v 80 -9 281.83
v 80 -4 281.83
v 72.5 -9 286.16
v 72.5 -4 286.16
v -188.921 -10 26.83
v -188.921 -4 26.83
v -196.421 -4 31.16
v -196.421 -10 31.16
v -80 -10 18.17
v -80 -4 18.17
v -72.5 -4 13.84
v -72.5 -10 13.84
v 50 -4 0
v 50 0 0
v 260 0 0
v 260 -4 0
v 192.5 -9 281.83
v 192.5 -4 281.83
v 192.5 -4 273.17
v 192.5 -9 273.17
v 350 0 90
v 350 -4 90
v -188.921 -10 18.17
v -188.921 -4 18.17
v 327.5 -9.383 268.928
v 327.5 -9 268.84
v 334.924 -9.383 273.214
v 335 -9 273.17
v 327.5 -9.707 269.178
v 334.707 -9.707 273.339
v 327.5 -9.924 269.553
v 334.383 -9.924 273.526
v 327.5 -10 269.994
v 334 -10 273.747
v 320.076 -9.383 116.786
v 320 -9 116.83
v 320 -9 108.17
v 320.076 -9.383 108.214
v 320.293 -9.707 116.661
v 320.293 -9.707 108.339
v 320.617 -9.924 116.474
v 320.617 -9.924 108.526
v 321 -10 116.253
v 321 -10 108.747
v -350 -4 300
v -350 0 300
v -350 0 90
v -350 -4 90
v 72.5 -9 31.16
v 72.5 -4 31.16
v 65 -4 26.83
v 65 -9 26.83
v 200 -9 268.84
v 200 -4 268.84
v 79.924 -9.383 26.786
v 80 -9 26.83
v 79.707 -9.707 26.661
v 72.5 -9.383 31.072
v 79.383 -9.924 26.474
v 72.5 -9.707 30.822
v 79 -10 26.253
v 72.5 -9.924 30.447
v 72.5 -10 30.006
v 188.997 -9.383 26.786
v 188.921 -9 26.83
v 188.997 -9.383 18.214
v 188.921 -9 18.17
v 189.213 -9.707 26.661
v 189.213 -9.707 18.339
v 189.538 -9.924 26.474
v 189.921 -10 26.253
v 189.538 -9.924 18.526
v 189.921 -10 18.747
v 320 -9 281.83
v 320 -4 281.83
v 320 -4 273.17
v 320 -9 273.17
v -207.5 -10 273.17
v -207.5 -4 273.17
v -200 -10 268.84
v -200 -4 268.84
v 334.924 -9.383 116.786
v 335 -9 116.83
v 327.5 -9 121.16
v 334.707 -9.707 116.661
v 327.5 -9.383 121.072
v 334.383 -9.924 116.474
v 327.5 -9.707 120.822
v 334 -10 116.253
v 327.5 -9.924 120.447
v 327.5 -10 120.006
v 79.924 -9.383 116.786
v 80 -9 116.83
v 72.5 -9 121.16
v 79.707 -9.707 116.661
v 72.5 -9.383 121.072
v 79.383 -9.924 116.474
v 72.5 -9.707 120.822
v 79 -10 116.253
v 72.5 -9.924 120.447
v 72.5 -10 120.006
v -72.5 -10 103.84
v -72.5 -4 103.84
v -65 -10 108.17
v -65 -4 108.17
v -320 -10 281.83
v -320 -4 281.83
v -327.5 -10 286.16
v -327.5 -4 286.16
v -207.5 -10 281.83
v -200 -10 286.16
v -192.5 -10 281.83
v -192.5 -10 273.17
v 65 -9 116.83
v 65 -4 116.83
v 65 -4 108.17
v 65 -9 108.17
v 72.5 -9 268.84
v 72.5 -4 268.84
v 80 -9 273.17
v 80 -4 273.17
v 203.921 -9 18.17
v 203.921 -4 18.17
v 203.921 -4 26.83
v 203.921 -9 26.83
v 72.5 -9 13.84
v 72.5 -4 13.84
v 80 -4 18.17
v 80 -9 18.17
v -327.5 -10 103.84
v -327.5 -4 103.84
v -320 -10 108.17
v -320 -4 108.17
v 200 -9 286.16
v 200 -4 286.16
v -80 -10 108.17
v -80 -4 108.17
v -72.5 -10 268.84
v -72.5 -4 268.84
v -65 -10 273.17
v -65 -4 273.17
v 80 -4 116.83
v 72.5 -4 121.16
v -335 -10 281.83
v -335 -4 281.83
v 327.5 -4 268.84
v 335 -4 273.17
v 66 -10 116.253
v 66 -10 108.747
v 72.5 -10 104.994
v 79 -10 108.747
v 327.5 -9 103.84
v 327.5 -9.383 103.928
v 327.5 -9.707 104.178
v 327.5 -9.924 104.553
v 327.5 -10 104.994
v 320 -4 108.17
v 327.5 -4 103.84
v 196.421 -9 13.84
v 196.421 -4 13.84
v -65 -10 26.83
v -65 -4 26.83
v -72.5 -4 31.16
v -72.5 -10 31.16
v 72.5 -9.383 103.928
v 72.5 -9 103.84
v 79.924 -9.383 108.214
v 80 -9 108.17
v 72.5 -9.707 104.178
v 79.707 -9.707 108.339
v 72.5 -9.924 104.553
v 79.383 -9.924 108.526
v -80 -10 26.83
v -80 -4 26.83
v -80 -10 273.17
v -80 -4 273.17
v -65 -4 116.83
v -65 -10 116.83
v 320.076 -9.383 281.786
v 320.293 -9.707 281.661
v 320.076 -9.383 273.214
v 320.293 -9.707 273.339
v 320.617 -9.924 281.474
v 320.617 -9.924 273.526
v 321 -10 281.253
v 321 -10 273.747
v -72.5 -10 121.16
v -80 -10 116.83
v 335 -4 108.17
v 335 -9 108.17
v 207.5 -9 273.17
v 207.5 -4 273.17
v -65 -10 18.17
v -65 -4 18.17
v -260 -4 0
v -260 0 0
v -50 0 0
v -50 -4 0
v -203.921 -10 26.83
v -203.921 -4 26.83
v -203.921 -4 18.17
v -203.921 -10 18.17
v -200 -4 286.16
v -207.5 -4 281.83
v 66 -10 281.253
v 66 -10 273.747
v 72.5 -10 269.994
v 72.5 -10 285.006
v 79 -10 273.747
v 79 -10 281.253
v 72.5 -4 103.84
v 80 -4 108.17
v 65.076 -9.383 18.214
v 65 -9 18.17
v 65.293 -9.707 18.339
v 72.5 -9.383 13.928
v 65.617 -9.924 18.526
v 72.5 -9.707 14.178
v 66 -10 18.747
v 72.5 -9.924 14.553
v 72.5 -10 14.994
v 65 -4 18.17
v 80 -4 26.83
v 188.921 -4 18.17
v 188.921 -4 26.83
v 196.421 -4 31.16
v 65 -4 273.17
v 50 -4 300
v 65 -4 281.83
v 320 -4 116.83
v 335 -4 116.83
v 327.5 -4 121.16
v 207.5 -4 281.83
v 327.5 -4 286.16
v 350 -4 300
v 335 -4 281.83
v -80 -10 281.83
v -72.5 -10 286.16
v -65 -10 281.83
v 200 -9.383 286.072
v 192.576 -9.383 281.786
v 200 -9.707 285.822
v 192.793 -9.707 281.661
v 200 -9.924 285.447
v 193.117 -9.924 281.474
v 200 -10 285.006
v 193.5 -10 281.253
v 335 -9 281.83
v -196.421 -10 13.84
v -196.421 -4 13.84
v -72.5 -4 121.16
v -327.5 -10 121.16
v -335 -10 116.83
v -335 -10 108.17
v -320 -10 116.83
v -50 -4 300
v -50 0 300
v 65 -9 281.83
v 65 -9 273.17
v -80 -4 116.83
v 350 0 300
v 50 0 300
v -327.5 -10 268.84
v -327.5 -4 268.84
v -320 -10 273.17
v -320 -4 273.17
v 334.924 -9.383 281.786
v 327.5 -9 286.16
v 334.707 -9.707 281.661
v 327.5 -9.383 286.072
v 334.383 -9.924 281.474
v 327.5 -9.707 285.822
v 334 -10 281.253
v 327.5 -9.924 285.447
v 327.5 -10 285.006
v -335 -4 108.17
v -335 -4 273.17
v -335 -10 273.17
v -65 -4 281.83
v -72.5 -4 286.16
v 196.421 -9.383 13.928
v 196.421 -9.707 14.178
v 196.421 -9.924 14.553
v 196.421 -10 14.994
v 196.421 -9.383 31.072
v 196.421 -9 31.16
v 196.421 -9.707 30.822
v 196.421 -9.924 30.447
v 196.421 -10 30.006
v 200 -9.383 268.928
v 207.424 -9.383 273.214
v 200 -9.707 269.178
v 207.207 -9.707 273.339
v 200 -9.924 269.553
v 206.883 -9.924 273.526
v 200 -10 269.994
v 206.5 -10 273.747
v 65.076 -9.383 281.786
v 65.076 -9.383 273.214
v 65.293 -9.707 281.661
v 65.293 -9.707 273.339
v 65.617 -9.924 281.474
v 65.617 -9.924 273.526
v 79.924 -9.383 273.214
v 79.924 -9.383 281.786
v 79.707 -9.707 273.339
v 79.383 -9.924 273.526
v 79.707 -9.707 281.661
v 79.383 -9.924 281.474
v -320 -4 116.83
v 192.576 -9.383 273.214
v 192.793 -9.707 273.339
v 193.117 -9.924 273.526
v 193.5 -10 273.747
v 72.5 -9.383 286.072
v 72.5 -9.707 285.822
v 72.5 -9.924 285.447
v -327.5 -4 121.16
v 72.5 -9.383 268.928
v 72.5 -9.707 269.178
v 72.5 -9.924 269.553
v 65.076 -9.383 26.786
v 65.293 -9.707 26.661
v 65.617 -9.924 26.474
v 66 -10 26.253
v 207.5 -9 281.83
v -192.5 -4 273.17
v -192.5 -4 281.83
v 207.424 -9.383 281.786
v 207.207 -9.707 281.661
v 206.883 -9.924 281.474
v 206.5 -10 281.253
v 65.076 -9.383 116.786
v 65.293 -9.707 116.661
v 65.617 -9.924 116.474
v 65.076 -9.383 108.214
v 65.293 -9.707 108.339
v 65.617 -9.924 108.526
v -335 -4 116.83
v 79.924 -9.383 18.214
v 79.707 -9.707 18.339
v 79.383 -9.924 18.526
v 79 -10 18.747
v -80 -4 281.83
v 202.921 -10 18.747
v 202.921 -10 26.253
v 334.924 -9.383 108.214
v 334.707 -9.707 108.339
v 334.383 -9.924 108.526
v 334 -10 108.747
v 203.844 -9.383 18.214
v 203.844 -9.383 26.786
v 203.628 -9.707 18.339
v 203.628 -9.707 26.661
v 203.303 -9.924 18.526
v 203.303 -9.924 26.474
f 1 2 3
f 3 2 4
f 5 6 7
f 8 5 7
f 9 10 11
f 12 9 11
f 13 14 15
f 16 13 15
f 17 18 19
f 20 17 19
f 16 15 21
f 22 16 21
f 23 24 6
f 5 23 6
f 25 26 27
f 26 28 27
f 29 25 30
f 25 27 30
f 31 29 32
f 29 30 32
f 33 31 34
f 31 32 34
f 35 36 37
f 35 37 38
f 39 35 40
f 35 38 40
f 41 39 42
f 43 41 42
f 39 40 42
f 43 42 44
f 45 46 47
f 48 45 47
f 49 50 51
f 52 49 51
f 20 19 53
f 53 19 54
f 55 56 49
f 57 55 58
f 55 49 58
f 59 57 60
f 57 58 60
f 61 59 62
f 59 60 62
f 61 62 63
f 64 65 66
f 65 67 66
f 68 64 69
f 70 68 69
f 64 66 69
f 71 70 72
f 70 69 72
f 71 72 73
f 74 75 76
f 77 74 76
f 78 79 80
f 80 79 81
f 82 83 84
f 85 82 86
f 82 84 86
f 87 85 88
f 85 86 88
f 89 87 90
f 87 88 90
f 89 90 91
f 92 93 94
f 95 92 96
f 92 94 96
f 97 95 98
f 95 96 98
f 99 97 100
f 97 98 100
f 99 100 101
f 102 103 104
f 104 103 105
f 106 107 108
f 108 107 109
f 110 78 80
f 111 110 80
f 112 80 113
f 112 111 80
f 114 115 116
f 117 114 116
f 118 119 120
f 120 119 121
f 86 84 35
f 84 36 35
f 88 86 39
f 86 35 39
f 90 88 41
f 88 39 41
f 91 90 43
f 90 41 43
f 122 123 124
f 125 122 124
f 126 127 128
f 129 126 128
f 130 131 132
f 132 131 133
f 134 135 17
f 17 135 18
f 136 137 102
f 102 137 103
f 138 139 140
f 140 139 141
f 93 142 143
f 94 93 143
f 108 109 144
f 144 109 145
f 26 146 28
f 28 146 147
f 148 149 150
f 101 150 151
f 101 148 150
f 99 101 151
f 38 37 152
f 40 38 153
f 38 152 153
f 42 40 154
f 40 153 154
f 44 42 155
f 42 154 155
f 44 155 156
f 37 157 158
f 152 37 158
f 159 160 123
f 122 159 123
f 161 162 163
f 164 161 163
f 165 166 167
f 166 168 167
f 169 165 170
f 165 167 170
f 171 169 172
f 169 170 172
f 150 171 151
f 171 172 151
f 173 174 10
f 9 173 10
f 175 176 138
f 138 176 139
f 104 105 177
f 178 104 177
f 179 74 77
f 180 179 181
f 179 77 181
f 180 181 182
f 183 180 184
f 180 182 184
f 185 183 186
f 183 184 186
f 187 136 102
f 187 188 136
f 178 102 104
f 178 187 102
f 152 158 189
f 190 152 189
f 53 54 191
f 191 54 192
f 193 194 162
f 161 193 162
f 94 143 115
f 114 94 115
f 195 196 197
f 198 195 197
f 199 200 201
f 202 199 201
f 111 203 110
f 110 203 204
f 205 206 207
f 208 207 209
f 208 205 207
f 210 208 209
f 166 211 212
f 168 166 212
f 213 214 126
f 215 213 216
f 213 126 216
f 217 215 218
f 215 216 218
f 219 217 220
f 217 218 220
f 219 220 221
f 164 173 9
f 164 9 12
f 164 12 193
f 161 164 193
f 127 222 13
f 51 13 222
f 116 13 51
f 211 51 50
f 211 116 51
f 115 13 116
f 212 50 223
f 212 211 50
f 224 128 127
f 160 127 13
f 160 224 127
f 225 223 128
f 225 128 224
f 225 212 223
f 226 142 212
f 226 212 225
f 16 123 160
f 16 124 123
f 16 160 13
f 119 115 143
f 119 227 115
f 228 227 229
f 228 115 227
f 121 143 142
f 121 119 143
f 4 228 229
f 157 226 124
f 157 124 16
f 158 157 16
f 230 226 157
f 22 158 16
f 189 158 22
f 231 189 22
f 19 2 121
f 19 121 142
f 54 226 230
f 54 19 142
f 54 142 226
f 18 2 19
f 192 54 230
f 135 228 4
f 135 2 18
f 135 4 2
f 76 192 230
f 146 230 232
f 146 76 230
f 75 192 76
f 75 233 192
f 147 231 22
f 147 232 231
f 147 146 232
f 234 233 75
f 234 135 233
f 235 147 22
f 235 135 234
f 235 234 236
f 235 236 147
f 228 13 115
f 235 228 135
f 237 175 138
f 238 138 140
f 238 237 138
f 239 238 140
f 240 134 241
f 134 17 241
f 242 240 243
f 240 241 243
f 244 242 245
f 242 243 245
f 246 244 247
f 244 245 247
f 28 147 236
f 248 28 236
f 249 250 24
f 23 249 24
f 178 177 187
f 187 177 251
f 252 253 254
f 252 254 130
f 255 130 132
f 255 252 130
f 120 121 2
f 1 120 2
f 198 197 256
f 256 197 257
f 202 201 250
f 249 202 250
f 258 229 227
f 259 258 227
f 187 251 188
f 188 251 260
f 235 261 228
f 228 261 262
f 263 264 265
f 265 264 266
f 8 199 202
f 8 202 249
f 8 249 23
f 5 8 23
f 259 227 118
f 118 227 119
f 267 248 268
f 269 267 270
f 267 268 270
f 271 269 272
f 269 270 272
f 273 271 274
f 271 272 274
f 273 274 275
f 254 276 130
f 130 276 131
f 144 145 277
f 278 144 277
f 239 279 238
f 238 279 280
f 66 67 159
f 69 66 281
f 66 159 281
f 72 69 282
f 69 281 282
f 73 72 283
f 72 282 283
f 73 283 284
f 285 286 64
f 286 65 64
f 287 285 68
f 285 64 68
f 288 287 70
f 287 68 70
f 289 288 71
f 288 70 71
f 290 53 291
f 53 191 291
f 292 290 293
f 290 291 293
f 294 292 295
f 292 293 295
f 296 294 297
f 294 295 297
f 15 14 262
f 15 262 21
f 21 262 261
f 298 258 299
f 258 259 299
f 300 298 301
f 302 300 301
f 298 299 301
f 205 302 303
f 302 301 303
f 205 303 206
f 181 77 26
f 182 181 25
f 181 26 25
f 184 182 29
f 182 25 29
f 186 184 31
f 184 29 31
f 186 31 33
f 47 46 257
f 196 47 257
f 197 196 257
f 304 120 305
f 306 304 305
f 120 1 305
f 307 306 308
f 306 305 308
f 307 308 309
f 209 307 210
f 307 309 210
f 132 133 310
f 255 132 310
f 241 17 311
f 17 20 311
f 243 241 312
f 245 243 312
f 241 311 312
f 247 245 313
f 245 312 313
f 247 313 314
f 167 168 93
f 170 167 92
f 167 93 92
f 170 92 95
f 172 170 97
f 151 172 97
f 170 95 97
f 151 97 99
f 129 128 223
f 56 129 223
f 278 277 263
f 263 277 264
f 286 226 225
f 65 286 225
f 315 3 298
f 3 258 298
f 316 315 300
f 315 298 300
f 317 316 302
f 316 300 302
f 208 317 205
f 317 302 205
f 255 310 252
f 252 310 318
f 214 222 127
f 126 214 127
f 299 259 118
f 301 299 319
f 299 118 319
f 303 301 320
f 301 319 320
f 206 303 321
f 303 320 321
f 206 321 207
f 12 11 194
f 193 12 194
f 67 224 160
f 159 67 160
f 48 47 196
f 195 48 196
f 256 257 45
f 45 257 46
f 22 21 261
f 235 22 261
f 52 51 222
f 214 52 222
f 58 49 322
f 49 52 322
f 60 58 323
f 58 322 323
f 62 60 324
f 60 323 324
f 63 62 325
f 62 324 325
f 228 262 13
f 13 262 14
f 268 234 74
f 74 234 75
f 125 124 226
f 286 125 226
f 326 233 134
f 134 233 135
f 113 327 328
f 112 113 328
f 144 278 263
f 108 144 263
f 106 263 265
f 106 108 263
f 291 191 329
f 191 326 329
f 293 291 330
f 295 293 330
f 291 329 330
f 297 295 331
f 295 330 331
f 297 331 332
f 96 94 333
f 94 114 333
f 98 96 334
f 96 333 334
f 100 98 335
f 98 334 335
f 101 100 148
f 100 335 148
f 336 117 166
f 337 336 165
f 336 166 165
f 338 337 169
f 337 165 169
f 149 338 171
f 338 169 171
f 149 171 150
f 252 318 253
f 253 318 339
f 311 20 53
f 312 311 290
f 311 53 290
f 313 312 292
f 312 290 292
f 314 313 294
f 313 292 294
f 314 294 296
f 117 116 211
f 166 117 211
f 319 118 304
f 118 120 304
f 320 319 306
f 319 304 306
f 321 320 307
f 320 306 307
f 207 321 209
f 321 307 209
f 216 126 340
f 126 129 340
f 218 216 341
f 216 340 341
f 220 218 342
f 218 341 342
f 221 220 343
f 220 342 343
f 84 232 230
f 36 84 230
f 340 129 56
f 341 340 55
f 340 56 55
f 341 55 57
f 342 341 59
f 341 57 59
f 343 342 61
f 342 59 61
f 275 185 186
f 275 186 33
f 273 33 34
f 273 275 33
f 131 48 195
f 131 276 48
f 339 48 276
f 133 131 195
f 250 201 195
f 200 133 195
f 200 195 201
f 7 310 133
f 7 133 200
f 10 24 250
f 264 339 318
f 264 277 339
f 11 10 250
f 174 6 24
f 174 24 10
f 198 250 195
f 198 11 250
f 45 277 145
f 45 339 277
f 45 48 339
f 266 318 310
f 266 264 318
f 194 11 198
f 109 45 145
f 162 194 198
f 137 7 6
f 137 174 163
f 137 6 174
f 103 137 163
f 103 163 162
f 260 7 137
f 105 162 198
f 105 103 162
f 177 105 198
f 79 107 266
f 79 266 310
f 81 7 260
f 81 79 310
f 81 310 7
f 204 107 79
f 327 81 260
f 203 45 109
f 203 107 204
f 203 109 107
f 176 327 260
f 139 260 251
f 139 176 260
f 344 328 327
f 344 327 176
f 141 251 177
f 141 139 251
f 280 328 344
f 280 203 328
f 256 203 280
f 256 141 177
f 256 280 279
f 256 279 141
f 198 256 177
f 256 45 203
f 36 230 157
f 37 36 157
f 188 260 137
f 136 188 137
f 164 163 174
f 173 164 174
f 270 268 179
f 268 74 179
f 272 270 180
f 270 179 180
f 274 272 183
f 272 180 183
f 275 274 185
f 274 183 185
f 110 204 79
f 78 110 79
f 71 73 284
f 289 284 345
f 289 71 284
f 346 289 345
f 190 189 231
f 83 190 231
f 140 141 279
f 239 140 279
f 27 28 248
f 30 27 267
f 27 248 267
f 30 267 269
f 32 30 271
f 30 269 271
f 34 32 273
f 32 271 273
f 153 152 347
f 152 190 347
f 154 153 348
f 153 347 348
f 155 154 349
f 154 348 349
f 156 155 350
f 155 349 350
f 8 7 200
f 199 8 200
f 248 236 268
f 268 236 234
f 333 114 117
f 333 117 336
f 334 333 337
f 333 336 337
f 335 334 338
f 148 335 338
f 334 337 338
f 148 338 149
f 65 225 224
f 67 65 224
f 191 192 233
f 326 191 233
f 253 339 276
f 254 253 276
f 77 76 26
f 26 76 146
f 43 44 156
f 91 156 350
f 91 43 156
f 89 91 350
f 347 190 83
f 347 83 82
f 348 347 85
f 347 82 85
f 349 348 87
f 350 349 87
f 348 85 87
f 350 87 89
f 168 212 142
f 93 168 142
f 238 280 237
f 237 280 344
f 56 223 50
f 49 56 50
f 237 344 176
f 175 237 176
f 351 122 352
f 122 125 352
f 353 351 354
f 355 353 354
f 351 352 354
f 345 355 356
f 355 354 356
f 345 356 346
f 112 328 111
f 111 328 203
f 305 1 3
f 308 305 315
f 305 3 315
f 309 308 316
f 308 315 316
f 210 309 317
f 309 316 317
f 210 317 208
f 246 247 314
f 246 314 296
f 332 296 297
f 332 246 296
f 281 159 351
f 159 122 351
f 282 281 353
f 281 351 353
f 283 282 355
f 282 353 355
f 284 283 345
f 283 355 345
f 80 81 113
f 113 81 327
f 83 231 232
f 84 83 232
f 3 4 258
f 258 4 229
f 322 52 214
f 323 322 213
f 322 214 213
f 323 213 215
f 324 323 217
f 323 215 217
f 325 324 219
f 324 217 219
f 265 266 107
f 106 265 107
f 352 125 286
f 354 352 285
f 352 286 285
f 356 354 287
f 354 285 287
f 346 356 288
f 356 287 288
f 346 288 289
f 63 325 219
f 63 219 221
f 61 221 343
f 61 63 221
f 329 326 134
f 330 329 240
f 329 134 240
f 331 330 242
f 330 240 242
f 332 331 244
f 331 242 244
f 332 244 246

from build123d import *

# Parameters (mm, degrees)
F1_DEPTH = 4
F3_DEPTH = 6
F4_R     = 1


with BuildPart() as f1:
    # F0 (on Front) → F1 (new body)
    with BuildSketch(Plane.XZ):
        Polygon((50, 300), (50, 0), (260, 0), (350, 90), (350, 300), align=None)
        Polygon((-350, 300), (-350, 90), (-260, 0), (-50, 0), (-50, 300), align=None)
    extrude(amount=F1_DEPTH)

    # F2 (on face) → F3 (join)
    with BuildSketch(Plane.XZ.offset(4)):
        Polygon((72.5, 268.839746), (80, 273.169873), (80, 281.830127), (72.5, 286.160254), (65, 281.830127), (65, 273.169873), align=None)
        Polygon((200, 268.839746), (207.5, 273.169873), (207.5, 281.830127), (200, 286.160254), (192.5, 281.830127), (192.5, 273.169873), align=None)
        Polygon((327.5, 268.839746), (335, 273.169873), (335, 281.830127), (327.5, 286.160254), (320, 281.830127), (320, 273.169873), align=None)
        Polygon((327.5, 103.839746), (335, 108.169873), (335, 116.830127), (327.5, 121.160254), (320, 116.830127), (320, 108.169873), align=None)
        Polygon((72.5, 103.839746), (80, 108.169873), (80, 116.830127), (72.5, 121.160254), (65, 116.830127), (65, 108.169873), align=None)
        Polygon((72.5, 13.839746), (80, 18.169873), (80, 26.830127), (72.5, 31.160254), (65, 26.830127), (65, 18.169873), align=None)
        Polygon((196.420535, 13.839746), (203.920535, 18.169873), (203.920535, 26.830127), (196.420535, 31.160254), (188.920535, 26.830127), (188.920535, 18.169873), align=None)
        Polygon((-327.5, 103.839746), (-320, 108.169873), (-320, 116.830127), (-327.5, 121.160254), (-335, 116.830127), (-335, 108.169873), align=None)
        Polygon((-80, 108.169873), (-72.5, 103.839746), (-65, 108.169873), (-65, 116.830127), (-72.5, 121.160254), (-80, 116.830127), align=None)
        Polygon((-203.920535, 26.830127), (-203.920535, 18.169873), (-196.420535, 13.839746), (-188.920535, 18.169873), (-188.920535, 26.830127), (-196.420535, 31.160254), align=None)
        Polygon((-200, 286.160254), (-207.5, 281.830127), (-207.5, 273.169873), (-200, 268.839746), (-192.5, 273.169873), (-192.5, 281.830127), align=None)
        Polygon((-72.5, 268.839746), (-65, 273.169873), (-65, 281.830127), (-72.5, 286.160254), (-80, 281.830127), (-80, 273.169873), align=None)
        Polygon((-327.5, 286.160254), (-335, 281.830127), (-335, 273.169873), (-327.5, 268.839746), (-320, 273.169873), (-320, 281.830127), align=None)
        Polygon((-65, 18.169873), (-65, 26.830127), (-72.5, 31.160254), (-80, 26.830127), (-80, 18.169873), (-72.5, 13.839746), align=None)
    extrude(amount=F3_DEPTH)

    # F4
    f4_edges = [f1.edges().sort_by_distance(p)[0] for p in [
        (76.25, -10, 271.004809),
        (80, -10, 277.5),
        (76.25, -10, 283.995191),
        (68.75, -10, 283.995191),
        (65, -10, 277.5),
        (68.75, -10, 271.004809),
        (203.75, -10, 271.004809),
        (207.5, -10, 277.5),
        (203.75, -10, 283.995191),
        (196.25, -10, 283.995191),
        (192.5, -10, 277.5),
        (196.25, -10, 271.004809),
        (331.25, -10, 271.004809),
        (335, -10, 277.5),
        (331.25, -10, 283.995191),
        (323.75, -10, 283.995191),
        (320, -10, 277.5),
        (323.75, -10, 271.004809),
        (76.25, -10, 106.004809),
        (80, -10, 112.5),
        (76.25, -10, 118.995191),
        (68.75, -10, 118.995191),
        (65, -10, 112.5),
        (68.75, -10, 106.004809),
        (323.75, -10, 106.004809),
        (331.25, -10, 106.004809),
        (335, -10, 112.5),
        (331.25, -10, 118.995191),
        (323.75, -10, 118.995191),
        (320, -10, 112.5),
        (200.170535, -10, 16.004809),
        (203.920535, -10, 22.5),
        (200.170535, -10, 28.995191),
        (192.670535, -10, 28.995191),
        (188.920535, -10, 22.5),
        (192.670535, -10, 16.004809),
        (76.25, -10, 16.004809),
        (80, -10, 22.5),
        (76.25, -10, 28.995191),
        (68.75, -10, 28.995191),
        (65, -10, 22.5),
        (68.75, -10, 16.004809),
    ]]
    fillet(f4_edges, radius=F4_R)


solid = f1.part
